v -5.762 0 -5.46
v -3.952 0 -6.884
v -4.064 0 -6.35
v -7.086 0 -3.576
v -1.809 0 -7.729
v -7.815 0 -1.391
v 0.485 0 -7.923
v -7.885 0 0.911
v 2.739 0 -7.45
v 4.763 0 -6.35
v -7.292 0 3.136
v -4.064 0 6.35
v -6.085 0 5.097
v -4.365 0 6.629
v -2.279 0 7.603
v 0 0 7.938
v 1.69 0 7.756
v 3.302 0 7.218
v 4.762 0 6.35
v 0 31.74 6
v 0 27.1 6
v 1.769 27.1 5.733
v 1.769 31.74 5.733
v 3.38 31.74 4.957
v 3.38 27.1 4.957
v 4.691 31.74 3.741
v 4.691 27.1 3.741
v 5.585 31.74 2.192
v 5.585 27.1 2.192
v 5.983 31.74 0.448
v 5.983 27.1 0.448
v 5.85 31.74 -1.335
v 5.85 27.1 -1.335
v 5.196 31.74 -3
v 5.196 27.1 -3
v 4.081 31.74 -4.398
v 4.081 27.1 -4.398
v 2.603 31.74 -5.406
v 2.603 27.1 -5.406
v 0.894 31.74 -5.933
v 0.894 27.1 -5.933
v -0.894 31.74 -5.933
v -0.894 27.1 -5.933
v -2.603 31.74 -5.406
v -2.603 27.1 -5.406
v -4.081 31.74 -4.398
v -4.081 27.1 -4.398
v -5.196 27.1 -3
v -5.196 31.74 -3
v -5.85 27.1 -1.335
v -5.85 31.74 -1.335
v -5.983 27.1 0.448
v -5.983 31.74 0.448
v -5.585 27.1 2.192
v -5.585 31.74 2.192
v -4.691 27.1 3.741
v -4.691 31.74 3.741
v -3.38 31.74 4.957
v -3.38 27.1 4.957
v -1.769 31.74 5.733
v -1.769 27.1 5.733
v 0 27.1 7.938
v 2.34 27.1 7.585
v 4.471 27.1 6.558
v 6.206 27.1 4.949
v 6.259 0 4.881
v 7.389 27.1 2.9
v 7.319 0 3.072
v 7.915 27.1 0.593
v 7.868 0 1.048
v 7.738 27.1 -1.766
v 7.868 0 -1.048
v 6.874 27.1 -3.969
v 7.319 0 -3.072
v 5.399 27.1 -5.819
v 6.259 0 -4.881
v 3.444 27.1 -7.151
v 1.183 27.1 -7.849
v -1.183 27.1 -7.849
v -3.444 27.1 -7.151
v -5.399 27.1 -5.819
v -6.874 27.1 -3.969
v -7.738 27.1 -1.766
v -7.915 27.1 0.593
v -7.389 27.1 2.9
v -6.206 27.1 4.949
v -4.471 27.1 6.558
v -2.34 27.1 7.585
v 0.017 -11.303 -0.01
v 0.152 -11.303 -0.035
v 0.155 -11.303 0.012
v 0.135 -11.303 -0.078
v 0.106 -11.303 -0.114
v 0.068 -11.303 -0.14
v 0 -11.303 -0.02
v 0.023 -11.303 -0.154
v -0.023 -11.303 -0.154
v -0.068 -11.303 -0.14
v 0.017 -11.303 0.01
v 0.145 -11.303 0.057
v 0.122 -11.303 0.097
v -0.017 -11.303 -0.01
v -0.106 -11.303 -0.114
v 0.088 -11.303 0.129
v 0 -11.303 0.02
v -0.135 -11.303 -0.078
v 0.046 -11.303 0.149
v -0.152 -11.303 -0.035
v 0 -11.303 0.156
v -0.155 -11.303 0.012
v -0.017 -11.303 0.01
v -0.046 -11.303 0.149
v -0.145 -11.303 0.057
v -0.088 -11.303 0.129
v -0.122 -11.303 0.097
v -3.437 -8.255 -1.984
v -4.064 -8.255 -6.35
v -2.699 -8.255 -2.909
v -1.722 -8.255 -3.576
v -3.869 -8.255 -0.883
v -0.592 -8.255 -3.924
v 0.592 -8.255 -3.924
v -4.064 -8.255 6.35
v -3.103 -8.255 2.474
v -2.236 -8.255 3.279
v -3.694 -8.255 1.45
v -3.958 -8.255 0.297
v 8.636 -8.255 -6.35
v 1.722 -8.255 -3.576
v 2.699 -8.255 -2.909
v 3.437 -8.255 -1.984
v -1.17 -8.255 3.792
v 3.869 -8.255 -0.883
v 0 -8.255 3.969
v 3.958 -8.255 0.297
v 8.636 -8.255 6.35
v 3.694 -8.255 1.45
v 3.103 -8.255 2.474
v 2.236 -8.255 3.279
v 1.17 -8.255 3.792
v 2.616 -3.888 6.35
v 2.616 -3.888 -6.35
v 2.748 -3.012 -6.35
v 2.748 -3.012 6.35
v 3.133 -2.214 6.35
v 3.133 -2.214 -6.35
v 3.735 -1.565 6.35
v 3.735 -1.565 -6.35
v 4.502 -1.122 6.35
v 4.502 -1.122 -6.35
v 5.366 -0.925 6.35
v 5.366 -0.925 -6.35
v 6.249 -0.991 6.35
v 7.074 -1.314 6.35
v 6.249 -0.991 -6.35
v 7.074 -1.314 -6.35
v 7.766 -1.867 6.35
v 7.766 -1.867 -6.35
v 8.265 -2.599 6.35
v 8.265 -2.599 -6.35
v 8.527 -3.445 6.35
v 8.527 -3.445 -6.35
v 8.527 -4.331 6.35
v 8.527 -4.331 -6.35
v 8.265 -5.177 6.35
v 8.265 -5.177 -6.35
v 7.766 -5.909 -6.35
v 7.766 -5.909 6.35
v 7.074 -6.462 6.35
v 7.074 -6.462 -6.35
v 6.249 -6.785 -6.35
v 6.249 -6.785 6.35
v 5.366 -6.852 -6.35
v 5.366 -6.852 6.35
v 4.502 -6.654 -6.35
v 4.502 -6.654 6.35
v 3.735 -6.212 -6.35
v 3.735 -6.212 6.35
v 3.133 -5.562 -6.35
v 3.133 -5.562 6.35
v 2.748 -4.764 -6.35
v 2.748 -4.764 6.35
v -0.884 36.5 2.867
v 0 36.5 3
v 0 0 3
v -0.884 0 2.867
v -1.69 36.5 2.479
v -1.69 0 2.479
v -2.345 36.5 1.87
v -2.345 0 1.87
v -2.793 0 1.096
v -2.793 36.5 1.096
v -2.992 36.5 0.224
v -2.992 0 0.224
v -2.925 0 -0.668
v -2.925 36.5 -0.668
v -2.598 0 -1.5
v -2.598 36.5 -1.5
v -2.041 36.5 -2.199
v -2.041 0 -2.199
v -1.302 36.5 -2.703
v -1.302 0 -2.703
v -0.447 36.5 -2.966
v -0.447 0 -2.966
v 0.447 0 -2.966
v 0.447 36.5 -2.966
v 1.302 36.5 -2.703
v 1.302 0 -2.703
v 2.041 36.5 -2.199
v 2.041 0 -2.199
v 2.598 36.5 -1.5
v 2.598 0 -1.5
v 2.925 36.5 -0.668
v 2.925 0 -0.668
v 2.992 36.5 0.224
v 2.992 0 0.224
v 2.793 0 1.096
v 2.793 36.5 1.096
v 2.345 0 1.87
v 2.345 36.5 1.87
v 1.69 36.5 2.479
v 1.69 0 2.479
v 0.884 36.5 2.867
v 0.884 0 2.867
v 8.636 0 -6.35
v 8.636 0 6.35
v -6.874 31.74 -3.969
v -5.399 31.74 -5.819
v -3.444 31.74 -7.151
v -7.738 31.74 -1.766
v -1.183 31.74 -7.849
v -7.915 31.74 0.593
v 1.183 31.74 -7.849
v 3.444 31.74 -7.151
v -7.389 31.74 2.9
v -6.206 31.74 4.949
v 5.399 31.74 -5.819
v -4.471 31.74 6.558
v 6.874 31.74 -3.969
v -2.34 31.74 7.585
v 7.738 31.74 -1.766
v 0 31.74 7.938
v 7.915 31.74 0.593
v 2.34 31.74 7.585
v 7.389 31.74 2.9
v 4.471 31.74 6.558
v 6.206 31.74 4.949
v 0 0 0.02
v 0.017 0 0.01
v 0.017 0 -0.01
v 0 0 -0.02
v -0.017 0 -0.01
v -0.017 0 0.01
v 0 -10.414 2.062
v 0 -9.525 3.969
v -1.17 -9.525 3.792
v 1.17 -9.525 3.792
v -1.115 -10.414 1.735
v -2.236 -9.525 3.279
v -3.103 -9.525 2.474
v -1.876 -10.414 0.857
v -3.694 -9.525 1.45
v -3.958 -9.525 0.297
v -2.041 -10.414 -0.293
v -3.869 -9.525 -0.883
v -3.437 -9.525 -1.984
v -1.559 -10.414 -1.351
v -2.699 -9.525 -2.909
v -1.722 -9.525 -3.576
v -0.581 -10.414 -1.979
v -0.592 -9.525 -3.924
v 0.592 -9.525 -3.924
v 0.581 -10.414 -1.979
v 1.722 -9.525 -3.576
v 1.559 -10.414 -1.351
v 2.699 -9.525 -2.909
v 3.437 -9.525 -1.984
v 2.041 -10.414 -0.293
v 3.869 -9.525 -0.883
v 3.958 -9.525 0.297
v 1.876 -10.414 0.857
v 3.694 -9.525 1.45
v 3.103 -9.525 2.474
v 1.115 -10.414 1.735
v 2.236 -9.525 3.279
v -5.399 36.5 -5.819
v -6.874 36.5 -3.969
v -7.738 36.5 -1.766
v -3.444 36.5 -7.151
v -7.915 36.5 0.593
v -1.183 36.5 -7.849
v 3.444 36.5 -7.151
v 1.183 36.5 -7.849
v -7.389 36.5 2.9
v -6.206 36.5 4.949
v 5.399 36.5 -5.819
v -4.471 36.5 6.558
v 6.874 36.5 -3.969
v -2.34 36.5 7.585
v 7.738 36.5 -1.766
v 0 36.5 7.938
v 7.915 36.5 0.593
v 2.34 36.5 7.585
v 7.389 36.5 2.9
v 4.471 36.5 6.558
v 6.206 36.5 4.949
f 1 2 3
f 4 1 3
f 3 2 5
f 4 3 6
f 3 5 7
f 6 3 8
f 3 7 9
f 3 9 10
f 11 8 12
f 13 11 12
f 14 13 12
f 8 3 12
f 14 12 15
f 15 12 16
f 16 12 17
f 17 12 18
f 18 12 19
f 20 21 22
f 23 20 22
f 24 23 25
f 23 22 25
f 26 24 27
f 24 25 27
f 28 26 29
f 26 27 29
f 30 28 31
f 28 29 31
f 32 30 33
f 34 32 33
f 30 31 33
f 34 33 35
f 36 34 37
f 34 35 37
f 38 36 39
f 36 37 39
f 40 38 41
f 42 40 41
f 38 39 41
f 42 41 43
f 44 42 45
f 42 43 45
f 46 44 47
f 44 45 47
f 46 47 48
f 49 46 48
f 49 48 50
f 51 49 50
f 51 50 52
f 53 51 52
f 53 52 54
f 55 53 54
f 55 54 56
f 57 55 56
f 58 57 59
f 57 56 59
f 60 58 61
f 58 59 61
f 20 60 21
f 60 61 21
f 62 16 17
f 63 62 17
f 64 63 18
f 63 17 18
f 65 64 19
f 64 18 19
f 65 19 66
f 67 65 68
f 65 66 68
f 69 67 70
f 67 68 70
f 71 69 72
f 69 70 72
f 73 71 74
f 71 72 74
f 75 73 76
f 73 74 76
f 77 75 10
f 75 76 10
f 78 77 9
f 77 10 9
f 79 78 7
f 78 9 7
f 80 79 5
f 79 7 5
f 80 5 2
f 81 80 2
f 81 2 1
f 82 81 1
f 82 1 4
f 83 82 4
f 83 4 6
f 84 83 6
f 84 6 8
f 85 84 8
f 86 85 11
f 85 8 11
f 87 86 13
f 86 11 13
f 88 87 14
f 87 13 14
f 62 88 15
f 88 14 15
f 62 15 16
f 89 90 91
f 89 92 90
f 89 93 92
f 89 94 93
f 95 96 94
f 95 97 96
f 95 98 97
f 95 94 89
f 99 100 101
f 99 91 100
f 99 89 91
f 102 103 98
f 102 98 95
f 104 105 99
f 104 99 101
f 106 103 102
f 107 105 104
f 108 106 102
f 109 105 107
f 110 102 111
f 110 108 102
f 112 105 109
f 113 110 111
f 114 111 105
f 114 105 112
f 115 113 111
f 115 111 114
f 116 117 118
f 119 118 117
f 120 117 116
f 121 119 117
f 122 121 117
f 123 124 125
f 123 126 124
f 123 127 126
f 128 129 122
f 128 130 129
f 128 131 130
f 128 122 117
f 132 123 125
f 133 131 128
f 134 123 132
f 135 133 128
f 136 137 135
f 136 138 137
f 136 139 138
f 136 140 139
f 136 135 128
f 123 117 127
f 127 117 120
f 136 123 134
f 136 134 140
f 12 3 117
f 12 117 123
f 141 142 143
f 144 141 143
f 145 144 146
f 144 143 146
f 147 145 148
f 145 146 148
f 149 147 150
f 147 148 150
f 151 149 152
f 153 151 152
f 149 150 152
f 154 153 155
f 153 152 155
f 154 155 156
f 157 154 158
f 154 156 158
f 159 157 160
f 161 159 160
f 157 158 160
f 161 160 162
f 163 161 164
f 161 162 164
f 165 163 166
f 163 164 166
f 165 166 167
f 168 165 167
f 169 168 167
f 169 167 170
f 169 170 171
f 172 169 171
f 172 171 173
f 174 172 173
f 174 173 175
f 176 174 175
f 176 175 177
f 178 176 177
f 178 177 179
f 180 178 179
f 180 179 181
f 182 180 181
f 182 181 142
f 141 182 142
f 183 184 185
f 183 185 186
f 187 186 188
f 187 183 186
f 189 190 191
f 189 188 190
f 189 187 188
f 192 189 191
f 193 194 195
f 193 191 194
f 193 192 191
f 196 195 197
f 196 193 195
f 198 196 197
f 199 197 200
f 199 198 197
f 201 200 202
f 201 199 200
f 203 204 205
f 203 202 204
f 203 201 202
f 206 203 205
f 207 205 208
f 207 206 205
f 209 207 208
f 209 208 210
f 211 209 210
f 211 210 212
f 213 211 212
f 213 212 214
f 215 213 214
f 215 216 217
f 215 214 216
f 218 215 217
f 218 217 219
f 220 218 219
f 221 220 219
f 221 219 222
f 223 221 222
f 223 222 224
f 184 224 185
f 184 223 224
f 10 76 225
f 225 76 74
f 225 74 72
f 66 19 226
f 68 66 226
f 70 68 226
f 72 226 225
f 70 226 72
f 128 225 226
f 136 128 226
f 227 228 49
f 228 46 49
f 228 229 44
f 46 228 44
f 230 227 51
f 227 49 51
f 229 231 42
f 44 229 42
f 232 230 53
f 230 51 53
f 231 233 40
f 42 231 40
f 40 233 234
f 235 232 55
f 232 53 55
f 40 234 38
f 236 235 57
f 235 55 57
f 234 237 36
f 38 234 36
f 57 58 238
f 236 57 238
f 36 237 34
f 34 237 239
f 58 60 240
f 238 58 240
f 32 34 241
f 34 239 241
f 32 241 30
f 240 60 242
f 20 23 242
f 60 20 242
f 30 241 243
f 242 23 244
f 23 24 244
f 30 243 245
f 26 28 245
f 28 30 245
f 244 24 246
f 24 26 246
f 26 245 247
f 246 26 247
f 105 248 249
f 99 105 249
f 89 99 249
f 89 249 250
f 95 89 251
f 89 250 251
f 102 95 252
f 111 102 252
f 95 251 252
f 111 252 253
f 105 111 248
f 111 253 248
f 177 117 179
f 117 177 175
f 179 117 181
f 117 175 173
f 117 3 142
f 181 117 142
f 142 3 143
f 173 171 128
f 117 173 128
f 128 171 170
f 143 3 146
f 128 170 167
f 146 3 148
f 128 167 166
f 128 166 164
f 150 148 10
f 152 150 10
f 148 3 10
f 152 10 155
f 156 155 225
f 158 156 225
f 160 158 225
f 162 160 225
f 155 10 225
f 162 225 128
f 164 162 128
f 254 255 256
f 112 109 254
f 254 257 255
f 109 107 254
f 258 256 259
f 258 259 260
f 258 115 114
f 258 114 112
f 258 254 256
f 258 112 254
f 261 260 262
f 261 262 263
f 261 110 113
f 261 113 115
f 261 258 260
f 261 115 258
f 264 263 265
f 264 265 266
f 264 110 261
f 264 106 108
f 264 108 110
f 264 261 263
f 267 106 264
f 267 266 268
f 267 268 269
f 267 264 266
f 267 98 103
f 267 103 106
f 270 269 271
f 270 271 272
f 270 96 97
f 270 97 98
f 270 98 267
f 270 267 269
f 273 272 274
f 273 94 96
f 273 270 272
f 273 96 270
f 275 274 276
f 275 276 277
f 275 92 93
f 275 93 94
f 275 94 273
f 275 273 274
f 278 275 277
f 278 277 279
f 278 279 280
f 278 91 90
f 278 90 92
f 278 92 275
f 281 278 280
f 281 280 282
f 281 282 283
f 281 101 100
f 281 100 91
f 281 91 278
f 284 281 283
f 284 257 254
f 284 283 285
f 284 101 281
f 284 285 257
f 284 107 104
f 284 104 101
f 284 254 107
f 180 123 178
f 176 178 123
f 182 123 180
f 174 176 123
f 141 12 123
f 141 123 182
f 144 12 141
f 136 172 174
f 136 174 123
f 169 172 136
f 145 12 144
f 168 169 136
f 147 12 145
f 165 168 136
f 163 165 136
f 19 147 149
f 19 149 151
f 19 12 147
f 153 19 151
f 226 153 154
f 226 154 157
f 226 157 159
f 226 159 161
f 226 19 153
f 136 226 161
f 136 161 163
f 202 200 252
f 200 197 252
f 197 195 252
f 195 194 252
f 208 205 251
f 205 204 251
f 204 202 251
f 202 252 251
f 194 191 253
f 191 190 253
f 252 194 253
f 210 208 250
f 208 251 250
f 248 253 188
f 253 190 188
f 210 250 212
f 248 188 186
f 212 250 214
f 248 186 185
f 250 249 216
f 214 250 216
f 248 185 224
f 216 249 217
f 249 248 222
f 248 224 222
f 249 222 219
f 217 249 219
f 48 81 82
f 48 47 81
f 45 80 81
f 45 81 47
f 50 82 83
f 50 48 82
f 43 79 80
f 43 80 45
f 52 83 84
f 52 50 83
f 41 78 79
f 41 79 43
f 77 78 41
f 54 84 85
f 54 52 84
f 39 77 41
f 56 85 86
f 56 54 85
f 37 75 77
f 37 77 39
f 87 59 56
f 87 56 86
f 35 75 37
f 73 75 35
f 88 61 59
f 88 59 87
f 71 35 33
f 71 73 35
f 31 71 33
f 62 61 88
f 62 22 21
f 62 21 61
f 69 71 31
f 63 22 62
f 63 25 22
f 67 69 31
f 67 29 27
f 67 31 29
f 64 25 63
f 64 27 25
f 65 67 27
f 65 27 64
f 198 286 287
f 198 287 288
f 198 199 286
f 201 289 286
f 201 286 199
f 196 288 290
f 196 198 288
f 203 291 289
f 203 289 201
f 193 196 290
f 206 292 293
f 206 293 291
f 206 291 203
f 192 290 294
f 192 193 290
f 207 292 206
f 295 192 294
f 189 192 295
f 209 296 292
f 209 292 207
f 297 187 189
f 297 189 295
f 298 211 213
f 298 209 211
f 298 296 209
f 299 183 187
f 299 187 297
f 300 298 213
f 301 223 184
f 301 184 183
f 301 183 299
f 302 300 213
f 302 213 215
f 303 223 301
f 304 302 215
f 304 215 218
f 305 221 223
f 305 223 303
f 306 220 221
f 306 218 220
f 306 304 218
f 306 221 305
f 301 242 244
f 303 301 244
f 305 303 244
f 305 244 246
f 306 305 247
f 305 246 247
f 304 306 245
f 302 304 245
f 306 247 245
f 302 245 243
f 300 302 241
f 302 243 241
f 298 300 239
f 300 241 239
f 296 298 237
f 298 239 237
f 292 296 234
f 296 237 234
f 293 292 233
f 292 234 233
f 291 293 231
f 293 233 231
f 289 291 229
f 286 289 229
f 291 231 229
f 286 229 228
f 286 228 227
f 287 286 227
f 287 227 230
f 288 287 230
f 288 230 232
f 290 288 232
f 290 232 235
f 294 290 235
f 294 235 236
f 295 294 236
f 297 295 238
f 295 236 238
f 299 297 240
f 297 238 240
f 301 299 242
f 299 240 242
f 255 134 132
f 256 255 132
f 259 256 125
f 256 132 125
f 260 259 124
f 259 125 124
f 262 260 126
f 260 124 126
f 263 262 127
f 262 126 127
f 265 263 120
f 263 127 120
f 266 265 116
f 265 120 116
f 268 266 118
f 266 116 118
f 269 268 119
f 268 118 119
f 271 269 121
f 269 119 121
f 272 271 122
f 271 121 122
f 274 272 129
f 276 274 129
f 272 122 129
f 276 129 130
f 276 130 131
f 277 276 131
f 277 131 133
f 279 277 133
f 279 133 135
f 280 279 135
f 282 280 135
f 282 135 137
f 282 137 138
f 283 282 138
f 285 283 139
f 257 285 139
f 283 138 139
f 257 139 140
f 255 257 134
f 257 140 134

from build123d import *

# Parameters (mm, degrees)
SKETCH1_R           = 7.9375
BOSS_EXTRUDE1_DEPTH = 27.10000002
SKETCH2_R           = 3
CUT_EXTRUDE1_DEPTH  = 36.5
SKETCH3_R           = 6
BOSS_EXTRUDE2_DEPTH = 4.64
SKETCH4_R           = 7.9375
BOSS_EXTRUDE3_DEPTH = 4.76
CUT_EXTRUDE2_START  = -81.214
SKETCH5_R           = 3
CUT_EXTRUDE2_DEPTH  = 81.214
SKETCH8_W           = 12.7
SKETCH8_H           = 12.7
BOSS_EXTRUDE5_DEPTH = 8.255
SKETCH11_R          = 3.96875
BOSS_EXTRUDE7_DEPTH = 1.27
SKETCH12_R          = 3.96875
BOSS_EXTRUDE8_DEPTH = 1.778
BOSS_EXTRUDE8_TAPER = 65
SKETCH13_R          = 2.9718
CUT_EXTRUDE9_DEPTH  = 25.4
SKETCH14_R          = 0.02
CUT_EXTRUDE10_DEPTH = 254


with BuildPart() as part:
    # Sketch1 → Boss-Extrude1 (new body)
    with BuildSketch(Plane(origin=(0, 0, 0), x_dir=(1, 0, 0), z_dir=(0, 1, 0))):
        with Locations(Location((0, 0, 0), (0, 0, 270))):
            Circle(SKETCH1_R)
    extrude(amount=BOSS_EXTRUDE1_DEPTH)

    # Sketch2 → Cut-Extrude1 (cut)
    with BuildSketch(Plane(origin=(0, 27.10000002, 0), x_dir=(1, 0, 0), z_dir=(0, 1, 0))):
        with Locations(Location((0, 0, 0), (0, 0, 270))):
            Circle(SKETCH2_R)
    extrude(amount=-CUT_EXTRUDE1_DEPTH, mode=Mode.SUBTRACT)

    # Sketch3 → Boss-Extrude2 (add)
    with BuildSketch(Plane(origin=(0, 27.10000002, 0), x_dir=(1, 0, 0), z_dir=(0, 1, 0))):
        with Locations(Location((0, 0, 0), (0, 0, 270))):
            Circle(SKETCH3_R)
    extrude(amount=BOSS_EXTRUDE2_DEPTH)

    # Sketch4 → Boss-Extrude3 (add)
    with BuildSketch(Plane(origin=(0, 31.74000002, 0), x_dir=(1, 0, 0), z_dir=(0, 1, 0))):
        with Locations(Location((0, 0, 0), (0, 0, 270))):
            Circle(SKETCH4_R)
    extrude(amount=BOSS_EXTRUDE3_DEPTH)

    # Sketch5 → Cut-Extrude2 (cut)
    with BuildSketch(Plane.XZ.offset(CUT_EXTRUDE2_START)):
        with Locations(Location((0, 0, 0), (0, 0, 90))):
            Circle(SKETCH5_R)
    extrude(amount=CUT_EXTRUDE2_DEPTH, mode=Mode.SUBTRACT)

    # Sketch8 → Boss-Extrude5 (add)
    with BuildSketch(Plane.XZ):
        with Locations((2.286, 0)):
            Rectangle(SKETCH8_W, SKETCH8_H)
    extrude(amount=BOSS_EXTRUDE5_DEPTH)

    # Sketch11 → Boss-Extrude7 (add)
    with BuildSketch(Plane.XZ.offset(8.255)):
        with Locations(Location((0, 0, 0), (0, 0, 90))):
            Circle(SKETCH11_R)
    extrude(amount=BOSS_EXTRUDE7_DEPTH)

    # Sketch12 → Boss-Extrude8 (add)
    with BuildSketch(Plane(origin=(0, -9.525, 0), x_dir=(-1, 0, 0), z_dir=(0, -1, 0))):
        with Locations(Location((0, 0, 0), (0, 0, 270))):
            Circle(SKETCH12_R)
    extrude(amount=BOSS_EXTRUDE8_DEPTH, taper=BOSS_EXTRUDE8_TAPER)

    # Sketch13 → Cut-Extrude9 (cut)
    with BuildSketch(Plane(origin=(0, 0, -6.35), x_dir=(-1, 0, 0), z_dir=(0, 0, -1))):
        with Locations((-5.588, -3.888060816)):
            Circle(SKETCH13_R)
    extrude(amount=-CUT_EXTRUDE9_DEPTH, mode=Mode.SUBTRACT)

    # Sketch14 → Cut-Extrude10 (cut)
    with BuildSketch(Plane(origin=(0, 36.50000002, 0), x_dir=(1, 0, 0), z_dir=(0, 1, 0))):
        with Locations(Location((0, 0, 0), (0, 0, 270))):
            Circle(SKETCH14_R)
    extrude(amount=-CUT_EXTRUDE10_DEPTH, mode=Mode.SUBTRACT)


solid = part.part
